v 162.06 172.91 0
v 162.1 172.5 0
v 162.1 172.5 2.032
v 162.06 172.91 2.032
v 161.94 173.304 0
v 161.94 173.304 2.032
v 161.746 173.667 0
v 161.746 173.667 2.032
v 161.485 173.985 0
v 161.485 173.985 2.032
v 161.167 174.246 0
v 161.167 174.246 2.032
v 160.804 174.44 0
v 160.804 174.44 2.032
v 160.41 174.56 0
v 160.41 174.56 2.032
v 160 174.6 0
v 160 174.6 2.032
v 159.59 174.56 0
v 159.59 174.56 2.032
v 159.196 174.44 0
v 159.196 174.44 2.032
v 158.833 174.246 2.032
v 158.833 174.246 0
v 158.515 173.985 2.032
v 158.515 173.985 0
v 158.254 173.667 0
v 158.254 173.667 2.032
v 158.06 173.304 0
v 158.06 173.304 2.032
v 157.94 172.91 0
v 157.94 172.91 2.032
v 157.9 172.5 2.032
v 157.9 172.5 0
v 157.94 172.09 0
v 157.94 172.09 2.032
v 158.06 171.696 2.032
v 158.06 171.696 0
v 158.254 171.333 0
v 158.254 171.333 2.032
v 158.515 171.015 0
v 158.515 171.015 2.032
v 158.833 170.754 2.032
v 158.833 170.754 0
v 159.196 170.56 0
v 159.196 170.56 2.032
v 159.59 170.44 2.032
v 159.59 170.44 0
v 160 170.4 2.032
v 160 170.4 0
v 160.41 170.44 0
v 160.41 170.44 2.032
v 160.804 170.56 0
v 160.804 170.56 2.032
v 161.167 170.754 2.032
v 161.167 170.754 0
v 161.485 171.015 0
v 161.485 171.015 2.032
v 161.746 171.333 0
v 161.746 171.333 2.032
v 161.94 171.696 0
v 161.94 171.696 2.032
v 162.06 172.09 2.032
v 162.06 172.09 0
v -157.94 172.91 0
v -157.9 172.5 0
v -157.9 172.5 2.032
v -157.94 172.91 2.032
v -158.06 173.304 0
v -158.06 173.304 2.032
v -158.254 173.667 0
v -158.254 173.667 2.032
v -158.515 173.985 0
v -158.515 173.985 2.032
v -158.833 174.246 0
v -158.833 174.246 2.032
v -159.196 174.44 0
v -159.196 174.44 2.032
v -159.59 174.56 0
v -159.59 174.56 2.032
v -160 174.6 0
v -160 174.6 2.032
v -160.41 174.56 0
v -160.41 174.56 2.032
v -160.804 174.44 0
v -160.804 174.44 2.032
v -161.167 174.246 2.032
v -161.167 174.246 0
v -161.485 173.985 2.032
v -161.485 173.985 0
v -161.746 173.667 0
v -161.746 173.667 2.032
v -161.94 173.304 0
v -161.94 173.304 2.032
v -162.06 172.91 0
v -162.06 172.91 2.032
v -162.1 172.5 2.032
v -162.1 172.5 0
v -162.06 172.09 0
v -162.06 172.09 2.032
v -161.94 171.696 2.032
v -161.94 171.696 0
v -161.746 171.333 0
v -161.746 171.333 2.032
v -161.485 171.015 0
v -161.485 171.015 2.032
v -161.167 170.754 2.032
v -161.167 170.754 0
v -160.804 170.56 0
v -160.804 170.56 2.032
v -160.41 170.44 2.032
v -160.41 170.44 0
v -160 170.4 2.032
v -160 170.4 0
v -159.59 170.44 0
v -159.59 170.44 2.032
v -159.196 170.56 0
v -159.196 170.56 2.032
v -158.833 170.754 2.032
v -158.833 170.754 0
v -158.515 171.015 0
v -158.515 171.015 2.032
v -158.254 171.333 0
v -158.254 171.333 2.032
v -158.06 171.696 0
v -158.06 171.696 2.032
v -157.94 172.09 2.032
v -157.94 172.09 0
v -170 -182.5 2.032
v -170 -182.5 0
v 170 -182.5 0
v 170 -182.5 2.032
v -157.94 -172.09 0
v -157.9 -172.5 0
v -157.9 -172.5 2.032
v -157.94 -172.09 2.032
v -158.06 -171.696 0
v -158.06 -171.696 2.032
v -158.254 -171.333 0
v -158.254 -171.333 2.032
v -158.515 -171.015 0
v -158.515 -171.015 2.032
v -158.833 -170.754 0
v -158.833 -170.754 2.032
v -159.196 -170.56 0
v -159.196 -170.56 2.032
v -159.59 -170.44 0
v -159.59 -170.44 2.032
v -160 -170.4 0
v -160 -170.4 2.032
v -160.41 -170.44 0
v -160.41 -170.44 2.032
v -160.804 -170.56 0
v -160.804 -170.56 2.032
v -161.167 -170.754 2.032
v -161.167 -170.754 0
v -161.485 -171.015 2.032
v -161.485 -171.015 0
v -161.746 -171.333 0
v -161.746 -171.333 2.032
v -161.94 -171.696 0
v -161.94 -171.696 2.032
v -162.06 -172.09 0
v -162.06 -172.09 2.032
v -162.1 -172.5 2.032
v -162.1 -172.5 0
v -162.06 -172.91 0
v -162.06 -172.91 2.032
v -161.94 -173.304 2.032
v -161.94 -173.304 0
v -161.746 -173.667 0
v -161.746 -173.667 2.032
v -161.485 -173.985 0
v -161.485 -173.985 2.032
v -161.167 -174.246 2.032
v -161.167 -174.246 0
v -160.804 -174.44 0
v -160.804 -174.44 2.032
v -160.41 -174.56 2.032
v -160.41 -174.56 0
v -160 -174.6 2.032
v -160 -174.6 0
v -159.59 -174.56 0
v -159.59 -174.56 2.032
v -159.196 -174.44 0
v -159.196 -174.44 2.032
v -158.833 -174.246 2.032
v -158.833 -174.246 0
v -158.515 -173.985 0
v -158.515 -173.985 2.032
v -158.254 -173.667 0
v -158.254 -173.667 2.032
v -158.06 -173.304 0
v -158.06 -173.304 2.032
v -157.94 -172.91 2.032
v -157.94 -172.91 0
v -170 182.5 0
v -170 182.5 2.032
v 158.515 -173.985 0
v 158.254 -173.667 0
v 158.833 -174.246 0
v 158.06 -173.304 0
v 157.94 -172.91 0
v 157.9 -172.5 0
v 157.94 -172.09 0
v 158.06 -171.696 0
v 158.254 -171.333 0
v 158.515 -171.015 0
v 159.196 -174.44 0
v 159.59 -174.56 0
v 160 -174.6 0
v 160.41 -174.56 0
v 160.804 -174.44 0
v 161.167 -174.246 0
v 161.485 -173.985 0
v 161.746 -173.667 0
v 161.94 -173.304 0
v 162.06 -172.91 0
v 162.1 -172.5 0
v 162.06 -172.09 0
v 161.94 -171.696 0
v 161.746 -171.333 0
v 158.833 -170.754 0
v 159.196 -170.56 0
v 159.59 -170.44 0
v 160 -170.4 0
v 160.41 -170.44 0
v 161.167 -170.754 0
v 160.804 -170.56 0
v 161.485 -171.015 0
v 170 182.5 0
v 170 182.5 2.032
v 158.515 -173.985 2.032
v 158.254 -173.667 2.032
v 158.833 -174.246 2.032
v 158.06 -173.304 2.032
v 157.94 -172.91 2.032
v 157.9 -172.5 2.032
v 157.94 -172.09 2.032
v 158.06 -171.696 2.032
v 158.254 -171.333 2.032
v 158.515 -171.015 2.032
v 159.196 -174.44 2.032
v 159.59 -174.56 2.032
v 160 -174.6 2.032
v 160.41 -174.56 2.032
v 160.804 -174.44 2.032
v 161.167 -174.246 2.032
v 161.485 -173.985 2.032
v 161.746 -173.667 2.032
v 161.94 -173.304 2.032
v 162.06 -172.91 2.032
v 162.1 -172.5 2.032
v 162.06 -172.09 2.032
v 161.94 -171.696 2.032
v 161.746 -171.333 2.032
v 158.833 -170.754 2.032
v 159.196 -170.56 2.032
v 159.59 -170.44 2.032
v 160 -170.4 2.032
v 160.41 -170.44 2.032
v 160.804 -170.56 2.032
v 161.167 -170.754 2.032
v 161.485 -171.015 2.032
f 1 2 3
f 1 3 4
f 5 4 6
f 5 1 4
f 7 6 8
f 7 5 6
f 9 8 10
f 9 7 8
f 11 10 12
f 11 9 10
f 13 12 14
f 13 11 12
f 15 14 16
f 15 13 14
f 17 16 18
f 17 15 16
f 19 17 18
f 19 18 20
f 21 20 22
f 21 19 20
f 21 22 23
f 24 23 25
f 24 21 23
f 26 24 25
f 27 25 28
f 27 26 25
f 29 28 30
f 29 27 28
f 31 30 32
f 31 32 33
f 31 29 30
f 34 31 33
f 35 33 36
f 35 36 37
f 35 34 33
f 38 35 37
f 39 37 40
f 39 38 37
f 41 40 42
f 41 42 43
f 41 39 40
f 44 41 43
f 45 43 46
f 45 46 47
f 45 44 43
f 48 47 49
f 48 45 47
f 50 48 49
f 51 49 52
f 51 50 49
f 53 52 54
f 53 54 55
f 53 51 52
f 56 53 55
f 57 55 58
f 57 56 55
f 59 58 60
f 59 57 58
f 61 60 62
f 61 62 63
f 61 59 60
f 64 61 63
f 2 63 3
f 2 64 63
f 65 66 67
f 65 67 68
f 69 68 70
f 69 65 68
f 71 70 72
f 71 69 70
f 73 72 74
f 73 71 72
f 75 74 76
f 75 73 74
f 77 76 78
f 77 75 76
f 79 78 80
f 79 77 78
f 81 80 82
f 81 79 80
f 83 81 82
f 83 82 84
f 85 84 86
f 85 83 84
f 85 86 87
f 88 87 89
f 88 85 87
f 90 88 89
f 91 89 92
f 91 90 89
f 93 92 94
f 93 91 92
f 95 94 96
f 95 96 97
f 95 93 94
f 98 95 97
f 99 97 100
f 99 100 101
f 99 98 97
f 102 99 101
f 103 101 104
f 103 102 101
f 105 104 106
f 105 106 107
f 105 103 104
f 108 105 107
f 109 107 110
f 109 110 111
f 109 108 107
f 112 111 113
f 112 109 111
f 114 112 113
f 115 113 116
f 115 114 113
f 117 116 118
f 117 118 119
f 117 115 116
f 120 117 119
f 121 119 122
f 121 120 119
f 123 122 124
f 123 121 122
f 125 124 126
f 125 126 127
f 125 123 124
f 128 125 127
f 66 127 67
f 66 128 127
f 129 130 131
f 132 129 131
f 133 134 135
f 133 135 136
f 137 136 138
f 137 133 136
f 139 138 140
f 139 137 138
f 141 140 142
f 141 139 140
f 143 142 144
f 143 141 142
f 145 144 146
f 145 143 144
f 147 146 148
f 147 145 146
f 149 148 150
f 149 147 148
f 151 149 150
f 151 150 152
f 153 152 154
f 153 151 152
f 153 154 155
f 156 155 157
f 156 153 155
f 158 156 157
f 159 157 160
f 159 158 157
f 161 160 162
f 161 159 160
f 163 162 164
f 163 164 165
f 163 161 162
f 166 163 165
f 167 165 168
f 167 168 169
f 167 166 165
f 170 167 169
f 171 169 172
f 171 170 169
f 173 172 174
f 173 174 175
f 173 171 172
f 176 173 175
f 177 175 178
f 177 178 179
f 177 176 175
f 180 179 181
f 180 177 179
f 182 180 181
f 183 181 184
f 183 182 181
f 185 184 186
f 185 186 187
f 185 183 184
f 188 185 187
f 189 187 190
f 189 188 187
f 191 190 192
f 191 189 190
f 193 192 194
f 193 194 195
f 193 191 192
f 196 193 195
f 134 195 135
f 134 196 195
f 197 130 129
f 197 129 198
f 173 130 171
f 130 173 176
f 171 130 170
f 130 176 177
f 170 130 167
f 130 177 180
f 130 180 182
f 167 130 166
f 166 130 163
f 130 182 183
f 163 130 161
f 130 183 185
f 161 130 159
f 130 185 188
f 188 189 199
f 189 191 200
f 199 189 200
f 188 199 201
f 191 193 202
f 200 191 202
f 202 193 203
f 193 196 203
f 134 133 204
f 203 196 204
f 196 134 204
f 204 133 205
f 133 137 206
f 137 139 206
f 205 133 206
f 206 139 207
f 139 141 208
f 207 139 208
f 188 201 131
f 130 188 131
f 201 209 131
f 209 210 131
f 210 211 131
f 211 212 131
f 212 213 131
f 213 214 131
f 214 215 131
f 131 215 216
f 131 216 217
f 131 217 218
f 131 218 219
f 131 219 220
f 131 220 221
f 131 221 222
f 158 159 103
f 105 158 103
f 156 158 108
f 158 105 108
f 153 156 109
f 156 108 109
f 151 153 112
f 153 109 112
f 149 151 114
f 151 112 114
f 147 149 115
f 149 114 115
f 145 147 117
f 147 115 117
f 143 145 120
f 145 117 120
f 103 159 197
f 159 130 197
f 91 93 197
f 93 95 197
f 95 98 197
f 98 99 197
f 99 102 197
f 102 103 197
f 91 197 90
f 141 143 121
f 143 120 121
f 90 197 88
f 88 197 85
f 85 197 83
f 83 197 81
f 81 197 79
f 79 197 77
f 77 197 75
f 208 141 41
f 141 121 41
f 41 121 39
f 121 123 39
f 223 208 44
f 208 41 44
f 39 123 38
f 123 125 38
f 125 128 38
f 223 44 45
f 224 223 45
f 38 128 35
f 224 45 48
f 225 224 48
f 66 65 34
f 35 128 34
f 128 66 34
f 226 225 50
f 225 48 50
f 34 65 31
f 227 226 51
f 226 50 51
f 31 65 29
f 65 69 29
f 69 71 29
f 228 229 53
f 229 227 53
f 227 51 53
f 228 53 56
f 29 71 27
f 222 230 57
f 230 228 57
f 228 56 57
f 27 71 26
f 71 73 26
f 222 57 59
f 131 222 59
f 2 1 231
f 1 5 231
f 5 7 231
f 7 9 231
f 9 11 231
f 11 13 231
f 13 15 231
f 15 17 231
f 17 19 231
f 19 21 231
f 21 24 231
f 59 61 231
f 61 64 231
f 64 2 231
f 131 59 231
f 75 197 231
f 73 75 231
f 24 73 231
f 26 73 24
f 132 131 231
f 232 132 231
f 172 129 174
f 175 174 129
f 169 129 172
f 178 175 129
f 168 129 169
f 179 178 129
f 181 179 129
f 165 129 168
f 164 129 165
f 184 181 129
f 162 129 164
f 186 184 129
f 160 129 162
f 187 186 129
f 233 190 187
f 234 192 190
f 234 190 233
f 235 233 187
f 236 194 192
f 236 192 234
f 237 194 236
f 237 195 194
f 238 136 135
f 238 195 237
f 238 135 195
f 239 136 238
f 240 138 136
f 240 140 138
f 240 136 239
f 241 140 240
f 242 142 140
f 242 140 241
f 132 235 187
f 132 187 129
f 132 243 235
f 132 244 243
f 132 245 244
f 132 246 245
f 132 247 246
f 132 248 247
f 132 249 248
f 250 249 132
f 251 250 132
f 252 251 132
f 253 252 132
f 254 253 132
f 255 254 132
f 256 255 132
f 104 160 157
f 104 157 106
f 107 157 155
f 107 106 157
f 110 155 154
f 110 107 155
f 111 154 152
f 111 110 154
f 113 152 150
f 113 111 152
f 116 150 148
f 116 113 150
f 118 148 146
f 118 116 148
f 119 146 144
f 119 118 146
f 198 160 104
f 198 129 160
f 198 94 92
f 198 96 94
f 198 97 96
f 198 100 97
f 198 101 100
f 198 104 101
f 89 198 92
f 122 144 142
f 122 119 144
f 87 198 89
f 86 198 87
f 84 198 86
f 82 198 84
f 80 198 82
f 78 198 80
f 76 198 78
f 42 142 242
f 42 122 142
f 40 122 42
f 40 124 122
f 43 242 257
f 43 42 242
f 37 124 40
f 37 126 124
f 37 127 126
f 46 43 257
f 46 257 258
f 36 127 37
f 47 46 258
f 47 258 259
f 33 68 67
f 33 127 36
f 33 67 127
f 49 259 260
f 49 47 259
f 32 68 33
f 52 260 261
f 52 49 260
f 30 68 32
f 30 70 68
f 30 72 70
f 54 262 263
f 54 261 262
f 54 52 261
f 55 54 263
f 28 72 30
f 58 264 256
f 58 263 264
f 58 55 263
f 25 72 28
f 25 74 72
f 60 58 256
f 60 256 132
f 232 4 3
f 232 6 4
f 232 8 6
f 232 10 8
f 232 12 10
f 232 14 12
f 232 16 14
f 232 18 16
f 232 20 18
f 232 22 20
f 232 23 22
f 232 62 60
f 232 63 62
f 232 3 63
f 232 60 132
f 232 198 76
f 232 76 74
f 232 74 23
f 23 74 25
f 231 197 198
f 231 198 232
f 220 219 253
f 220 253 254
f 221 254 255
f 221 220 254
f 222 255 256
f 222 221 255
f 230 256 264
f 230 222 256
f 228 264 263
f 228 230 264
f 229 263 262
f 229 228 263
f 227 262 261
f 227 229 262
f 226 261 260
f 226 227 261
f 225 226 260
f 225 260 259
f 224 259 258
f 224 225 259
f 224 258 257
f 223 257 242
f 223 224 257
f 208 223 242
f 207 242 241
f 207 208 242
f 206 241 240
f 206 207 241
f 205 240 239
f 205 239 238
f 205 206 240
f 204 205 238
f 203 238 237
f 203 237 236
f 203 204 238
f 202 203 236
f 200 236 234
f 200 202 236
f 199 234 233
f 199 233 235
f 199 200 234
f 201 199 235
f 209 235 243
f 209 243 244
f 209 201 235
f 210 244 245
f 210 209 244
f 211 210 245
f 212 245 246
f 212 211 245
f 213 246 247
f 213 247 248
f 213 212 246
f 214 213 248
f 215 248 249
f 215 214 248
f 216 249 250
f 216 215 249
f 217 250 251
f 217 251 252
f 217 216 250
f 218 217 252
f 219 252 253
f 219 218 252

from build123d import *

# Parameters (mm, degrees)
SKETCH1_W           = 340
SKETCH1_H           = 365
SKETCH1_R           = 2.1
BOSS_EXTRUDE1_DEPTH = 2.032


with BuildPart() as part:
    # Sketch1 → Boss-Extrude1 (new body)
    with BuildSketch(Plane.XY):
        Rectangle(SKETCH1_W, SKETCH1_H)
        with Locations((-160, -172.5)):
            Circle(SKETCH1_R, mode=Mode.SUBTRACT)
        with Locations((160, -172.5)):
            Circle(SKETCH1_R, mode=Mode.SUBTRACT)
        with Locations((160, 172.5)):
            Circle(SKETCH1_R, mode=Mode.SUBTRACT)
        with Locations((-160, 172.5)):
            Circle(SKETCH1_R, mode=Mode.SUBTRACT)
    extrude(amount=BOSS_EXTRUDE1_DEPTH)


solid = part.part
